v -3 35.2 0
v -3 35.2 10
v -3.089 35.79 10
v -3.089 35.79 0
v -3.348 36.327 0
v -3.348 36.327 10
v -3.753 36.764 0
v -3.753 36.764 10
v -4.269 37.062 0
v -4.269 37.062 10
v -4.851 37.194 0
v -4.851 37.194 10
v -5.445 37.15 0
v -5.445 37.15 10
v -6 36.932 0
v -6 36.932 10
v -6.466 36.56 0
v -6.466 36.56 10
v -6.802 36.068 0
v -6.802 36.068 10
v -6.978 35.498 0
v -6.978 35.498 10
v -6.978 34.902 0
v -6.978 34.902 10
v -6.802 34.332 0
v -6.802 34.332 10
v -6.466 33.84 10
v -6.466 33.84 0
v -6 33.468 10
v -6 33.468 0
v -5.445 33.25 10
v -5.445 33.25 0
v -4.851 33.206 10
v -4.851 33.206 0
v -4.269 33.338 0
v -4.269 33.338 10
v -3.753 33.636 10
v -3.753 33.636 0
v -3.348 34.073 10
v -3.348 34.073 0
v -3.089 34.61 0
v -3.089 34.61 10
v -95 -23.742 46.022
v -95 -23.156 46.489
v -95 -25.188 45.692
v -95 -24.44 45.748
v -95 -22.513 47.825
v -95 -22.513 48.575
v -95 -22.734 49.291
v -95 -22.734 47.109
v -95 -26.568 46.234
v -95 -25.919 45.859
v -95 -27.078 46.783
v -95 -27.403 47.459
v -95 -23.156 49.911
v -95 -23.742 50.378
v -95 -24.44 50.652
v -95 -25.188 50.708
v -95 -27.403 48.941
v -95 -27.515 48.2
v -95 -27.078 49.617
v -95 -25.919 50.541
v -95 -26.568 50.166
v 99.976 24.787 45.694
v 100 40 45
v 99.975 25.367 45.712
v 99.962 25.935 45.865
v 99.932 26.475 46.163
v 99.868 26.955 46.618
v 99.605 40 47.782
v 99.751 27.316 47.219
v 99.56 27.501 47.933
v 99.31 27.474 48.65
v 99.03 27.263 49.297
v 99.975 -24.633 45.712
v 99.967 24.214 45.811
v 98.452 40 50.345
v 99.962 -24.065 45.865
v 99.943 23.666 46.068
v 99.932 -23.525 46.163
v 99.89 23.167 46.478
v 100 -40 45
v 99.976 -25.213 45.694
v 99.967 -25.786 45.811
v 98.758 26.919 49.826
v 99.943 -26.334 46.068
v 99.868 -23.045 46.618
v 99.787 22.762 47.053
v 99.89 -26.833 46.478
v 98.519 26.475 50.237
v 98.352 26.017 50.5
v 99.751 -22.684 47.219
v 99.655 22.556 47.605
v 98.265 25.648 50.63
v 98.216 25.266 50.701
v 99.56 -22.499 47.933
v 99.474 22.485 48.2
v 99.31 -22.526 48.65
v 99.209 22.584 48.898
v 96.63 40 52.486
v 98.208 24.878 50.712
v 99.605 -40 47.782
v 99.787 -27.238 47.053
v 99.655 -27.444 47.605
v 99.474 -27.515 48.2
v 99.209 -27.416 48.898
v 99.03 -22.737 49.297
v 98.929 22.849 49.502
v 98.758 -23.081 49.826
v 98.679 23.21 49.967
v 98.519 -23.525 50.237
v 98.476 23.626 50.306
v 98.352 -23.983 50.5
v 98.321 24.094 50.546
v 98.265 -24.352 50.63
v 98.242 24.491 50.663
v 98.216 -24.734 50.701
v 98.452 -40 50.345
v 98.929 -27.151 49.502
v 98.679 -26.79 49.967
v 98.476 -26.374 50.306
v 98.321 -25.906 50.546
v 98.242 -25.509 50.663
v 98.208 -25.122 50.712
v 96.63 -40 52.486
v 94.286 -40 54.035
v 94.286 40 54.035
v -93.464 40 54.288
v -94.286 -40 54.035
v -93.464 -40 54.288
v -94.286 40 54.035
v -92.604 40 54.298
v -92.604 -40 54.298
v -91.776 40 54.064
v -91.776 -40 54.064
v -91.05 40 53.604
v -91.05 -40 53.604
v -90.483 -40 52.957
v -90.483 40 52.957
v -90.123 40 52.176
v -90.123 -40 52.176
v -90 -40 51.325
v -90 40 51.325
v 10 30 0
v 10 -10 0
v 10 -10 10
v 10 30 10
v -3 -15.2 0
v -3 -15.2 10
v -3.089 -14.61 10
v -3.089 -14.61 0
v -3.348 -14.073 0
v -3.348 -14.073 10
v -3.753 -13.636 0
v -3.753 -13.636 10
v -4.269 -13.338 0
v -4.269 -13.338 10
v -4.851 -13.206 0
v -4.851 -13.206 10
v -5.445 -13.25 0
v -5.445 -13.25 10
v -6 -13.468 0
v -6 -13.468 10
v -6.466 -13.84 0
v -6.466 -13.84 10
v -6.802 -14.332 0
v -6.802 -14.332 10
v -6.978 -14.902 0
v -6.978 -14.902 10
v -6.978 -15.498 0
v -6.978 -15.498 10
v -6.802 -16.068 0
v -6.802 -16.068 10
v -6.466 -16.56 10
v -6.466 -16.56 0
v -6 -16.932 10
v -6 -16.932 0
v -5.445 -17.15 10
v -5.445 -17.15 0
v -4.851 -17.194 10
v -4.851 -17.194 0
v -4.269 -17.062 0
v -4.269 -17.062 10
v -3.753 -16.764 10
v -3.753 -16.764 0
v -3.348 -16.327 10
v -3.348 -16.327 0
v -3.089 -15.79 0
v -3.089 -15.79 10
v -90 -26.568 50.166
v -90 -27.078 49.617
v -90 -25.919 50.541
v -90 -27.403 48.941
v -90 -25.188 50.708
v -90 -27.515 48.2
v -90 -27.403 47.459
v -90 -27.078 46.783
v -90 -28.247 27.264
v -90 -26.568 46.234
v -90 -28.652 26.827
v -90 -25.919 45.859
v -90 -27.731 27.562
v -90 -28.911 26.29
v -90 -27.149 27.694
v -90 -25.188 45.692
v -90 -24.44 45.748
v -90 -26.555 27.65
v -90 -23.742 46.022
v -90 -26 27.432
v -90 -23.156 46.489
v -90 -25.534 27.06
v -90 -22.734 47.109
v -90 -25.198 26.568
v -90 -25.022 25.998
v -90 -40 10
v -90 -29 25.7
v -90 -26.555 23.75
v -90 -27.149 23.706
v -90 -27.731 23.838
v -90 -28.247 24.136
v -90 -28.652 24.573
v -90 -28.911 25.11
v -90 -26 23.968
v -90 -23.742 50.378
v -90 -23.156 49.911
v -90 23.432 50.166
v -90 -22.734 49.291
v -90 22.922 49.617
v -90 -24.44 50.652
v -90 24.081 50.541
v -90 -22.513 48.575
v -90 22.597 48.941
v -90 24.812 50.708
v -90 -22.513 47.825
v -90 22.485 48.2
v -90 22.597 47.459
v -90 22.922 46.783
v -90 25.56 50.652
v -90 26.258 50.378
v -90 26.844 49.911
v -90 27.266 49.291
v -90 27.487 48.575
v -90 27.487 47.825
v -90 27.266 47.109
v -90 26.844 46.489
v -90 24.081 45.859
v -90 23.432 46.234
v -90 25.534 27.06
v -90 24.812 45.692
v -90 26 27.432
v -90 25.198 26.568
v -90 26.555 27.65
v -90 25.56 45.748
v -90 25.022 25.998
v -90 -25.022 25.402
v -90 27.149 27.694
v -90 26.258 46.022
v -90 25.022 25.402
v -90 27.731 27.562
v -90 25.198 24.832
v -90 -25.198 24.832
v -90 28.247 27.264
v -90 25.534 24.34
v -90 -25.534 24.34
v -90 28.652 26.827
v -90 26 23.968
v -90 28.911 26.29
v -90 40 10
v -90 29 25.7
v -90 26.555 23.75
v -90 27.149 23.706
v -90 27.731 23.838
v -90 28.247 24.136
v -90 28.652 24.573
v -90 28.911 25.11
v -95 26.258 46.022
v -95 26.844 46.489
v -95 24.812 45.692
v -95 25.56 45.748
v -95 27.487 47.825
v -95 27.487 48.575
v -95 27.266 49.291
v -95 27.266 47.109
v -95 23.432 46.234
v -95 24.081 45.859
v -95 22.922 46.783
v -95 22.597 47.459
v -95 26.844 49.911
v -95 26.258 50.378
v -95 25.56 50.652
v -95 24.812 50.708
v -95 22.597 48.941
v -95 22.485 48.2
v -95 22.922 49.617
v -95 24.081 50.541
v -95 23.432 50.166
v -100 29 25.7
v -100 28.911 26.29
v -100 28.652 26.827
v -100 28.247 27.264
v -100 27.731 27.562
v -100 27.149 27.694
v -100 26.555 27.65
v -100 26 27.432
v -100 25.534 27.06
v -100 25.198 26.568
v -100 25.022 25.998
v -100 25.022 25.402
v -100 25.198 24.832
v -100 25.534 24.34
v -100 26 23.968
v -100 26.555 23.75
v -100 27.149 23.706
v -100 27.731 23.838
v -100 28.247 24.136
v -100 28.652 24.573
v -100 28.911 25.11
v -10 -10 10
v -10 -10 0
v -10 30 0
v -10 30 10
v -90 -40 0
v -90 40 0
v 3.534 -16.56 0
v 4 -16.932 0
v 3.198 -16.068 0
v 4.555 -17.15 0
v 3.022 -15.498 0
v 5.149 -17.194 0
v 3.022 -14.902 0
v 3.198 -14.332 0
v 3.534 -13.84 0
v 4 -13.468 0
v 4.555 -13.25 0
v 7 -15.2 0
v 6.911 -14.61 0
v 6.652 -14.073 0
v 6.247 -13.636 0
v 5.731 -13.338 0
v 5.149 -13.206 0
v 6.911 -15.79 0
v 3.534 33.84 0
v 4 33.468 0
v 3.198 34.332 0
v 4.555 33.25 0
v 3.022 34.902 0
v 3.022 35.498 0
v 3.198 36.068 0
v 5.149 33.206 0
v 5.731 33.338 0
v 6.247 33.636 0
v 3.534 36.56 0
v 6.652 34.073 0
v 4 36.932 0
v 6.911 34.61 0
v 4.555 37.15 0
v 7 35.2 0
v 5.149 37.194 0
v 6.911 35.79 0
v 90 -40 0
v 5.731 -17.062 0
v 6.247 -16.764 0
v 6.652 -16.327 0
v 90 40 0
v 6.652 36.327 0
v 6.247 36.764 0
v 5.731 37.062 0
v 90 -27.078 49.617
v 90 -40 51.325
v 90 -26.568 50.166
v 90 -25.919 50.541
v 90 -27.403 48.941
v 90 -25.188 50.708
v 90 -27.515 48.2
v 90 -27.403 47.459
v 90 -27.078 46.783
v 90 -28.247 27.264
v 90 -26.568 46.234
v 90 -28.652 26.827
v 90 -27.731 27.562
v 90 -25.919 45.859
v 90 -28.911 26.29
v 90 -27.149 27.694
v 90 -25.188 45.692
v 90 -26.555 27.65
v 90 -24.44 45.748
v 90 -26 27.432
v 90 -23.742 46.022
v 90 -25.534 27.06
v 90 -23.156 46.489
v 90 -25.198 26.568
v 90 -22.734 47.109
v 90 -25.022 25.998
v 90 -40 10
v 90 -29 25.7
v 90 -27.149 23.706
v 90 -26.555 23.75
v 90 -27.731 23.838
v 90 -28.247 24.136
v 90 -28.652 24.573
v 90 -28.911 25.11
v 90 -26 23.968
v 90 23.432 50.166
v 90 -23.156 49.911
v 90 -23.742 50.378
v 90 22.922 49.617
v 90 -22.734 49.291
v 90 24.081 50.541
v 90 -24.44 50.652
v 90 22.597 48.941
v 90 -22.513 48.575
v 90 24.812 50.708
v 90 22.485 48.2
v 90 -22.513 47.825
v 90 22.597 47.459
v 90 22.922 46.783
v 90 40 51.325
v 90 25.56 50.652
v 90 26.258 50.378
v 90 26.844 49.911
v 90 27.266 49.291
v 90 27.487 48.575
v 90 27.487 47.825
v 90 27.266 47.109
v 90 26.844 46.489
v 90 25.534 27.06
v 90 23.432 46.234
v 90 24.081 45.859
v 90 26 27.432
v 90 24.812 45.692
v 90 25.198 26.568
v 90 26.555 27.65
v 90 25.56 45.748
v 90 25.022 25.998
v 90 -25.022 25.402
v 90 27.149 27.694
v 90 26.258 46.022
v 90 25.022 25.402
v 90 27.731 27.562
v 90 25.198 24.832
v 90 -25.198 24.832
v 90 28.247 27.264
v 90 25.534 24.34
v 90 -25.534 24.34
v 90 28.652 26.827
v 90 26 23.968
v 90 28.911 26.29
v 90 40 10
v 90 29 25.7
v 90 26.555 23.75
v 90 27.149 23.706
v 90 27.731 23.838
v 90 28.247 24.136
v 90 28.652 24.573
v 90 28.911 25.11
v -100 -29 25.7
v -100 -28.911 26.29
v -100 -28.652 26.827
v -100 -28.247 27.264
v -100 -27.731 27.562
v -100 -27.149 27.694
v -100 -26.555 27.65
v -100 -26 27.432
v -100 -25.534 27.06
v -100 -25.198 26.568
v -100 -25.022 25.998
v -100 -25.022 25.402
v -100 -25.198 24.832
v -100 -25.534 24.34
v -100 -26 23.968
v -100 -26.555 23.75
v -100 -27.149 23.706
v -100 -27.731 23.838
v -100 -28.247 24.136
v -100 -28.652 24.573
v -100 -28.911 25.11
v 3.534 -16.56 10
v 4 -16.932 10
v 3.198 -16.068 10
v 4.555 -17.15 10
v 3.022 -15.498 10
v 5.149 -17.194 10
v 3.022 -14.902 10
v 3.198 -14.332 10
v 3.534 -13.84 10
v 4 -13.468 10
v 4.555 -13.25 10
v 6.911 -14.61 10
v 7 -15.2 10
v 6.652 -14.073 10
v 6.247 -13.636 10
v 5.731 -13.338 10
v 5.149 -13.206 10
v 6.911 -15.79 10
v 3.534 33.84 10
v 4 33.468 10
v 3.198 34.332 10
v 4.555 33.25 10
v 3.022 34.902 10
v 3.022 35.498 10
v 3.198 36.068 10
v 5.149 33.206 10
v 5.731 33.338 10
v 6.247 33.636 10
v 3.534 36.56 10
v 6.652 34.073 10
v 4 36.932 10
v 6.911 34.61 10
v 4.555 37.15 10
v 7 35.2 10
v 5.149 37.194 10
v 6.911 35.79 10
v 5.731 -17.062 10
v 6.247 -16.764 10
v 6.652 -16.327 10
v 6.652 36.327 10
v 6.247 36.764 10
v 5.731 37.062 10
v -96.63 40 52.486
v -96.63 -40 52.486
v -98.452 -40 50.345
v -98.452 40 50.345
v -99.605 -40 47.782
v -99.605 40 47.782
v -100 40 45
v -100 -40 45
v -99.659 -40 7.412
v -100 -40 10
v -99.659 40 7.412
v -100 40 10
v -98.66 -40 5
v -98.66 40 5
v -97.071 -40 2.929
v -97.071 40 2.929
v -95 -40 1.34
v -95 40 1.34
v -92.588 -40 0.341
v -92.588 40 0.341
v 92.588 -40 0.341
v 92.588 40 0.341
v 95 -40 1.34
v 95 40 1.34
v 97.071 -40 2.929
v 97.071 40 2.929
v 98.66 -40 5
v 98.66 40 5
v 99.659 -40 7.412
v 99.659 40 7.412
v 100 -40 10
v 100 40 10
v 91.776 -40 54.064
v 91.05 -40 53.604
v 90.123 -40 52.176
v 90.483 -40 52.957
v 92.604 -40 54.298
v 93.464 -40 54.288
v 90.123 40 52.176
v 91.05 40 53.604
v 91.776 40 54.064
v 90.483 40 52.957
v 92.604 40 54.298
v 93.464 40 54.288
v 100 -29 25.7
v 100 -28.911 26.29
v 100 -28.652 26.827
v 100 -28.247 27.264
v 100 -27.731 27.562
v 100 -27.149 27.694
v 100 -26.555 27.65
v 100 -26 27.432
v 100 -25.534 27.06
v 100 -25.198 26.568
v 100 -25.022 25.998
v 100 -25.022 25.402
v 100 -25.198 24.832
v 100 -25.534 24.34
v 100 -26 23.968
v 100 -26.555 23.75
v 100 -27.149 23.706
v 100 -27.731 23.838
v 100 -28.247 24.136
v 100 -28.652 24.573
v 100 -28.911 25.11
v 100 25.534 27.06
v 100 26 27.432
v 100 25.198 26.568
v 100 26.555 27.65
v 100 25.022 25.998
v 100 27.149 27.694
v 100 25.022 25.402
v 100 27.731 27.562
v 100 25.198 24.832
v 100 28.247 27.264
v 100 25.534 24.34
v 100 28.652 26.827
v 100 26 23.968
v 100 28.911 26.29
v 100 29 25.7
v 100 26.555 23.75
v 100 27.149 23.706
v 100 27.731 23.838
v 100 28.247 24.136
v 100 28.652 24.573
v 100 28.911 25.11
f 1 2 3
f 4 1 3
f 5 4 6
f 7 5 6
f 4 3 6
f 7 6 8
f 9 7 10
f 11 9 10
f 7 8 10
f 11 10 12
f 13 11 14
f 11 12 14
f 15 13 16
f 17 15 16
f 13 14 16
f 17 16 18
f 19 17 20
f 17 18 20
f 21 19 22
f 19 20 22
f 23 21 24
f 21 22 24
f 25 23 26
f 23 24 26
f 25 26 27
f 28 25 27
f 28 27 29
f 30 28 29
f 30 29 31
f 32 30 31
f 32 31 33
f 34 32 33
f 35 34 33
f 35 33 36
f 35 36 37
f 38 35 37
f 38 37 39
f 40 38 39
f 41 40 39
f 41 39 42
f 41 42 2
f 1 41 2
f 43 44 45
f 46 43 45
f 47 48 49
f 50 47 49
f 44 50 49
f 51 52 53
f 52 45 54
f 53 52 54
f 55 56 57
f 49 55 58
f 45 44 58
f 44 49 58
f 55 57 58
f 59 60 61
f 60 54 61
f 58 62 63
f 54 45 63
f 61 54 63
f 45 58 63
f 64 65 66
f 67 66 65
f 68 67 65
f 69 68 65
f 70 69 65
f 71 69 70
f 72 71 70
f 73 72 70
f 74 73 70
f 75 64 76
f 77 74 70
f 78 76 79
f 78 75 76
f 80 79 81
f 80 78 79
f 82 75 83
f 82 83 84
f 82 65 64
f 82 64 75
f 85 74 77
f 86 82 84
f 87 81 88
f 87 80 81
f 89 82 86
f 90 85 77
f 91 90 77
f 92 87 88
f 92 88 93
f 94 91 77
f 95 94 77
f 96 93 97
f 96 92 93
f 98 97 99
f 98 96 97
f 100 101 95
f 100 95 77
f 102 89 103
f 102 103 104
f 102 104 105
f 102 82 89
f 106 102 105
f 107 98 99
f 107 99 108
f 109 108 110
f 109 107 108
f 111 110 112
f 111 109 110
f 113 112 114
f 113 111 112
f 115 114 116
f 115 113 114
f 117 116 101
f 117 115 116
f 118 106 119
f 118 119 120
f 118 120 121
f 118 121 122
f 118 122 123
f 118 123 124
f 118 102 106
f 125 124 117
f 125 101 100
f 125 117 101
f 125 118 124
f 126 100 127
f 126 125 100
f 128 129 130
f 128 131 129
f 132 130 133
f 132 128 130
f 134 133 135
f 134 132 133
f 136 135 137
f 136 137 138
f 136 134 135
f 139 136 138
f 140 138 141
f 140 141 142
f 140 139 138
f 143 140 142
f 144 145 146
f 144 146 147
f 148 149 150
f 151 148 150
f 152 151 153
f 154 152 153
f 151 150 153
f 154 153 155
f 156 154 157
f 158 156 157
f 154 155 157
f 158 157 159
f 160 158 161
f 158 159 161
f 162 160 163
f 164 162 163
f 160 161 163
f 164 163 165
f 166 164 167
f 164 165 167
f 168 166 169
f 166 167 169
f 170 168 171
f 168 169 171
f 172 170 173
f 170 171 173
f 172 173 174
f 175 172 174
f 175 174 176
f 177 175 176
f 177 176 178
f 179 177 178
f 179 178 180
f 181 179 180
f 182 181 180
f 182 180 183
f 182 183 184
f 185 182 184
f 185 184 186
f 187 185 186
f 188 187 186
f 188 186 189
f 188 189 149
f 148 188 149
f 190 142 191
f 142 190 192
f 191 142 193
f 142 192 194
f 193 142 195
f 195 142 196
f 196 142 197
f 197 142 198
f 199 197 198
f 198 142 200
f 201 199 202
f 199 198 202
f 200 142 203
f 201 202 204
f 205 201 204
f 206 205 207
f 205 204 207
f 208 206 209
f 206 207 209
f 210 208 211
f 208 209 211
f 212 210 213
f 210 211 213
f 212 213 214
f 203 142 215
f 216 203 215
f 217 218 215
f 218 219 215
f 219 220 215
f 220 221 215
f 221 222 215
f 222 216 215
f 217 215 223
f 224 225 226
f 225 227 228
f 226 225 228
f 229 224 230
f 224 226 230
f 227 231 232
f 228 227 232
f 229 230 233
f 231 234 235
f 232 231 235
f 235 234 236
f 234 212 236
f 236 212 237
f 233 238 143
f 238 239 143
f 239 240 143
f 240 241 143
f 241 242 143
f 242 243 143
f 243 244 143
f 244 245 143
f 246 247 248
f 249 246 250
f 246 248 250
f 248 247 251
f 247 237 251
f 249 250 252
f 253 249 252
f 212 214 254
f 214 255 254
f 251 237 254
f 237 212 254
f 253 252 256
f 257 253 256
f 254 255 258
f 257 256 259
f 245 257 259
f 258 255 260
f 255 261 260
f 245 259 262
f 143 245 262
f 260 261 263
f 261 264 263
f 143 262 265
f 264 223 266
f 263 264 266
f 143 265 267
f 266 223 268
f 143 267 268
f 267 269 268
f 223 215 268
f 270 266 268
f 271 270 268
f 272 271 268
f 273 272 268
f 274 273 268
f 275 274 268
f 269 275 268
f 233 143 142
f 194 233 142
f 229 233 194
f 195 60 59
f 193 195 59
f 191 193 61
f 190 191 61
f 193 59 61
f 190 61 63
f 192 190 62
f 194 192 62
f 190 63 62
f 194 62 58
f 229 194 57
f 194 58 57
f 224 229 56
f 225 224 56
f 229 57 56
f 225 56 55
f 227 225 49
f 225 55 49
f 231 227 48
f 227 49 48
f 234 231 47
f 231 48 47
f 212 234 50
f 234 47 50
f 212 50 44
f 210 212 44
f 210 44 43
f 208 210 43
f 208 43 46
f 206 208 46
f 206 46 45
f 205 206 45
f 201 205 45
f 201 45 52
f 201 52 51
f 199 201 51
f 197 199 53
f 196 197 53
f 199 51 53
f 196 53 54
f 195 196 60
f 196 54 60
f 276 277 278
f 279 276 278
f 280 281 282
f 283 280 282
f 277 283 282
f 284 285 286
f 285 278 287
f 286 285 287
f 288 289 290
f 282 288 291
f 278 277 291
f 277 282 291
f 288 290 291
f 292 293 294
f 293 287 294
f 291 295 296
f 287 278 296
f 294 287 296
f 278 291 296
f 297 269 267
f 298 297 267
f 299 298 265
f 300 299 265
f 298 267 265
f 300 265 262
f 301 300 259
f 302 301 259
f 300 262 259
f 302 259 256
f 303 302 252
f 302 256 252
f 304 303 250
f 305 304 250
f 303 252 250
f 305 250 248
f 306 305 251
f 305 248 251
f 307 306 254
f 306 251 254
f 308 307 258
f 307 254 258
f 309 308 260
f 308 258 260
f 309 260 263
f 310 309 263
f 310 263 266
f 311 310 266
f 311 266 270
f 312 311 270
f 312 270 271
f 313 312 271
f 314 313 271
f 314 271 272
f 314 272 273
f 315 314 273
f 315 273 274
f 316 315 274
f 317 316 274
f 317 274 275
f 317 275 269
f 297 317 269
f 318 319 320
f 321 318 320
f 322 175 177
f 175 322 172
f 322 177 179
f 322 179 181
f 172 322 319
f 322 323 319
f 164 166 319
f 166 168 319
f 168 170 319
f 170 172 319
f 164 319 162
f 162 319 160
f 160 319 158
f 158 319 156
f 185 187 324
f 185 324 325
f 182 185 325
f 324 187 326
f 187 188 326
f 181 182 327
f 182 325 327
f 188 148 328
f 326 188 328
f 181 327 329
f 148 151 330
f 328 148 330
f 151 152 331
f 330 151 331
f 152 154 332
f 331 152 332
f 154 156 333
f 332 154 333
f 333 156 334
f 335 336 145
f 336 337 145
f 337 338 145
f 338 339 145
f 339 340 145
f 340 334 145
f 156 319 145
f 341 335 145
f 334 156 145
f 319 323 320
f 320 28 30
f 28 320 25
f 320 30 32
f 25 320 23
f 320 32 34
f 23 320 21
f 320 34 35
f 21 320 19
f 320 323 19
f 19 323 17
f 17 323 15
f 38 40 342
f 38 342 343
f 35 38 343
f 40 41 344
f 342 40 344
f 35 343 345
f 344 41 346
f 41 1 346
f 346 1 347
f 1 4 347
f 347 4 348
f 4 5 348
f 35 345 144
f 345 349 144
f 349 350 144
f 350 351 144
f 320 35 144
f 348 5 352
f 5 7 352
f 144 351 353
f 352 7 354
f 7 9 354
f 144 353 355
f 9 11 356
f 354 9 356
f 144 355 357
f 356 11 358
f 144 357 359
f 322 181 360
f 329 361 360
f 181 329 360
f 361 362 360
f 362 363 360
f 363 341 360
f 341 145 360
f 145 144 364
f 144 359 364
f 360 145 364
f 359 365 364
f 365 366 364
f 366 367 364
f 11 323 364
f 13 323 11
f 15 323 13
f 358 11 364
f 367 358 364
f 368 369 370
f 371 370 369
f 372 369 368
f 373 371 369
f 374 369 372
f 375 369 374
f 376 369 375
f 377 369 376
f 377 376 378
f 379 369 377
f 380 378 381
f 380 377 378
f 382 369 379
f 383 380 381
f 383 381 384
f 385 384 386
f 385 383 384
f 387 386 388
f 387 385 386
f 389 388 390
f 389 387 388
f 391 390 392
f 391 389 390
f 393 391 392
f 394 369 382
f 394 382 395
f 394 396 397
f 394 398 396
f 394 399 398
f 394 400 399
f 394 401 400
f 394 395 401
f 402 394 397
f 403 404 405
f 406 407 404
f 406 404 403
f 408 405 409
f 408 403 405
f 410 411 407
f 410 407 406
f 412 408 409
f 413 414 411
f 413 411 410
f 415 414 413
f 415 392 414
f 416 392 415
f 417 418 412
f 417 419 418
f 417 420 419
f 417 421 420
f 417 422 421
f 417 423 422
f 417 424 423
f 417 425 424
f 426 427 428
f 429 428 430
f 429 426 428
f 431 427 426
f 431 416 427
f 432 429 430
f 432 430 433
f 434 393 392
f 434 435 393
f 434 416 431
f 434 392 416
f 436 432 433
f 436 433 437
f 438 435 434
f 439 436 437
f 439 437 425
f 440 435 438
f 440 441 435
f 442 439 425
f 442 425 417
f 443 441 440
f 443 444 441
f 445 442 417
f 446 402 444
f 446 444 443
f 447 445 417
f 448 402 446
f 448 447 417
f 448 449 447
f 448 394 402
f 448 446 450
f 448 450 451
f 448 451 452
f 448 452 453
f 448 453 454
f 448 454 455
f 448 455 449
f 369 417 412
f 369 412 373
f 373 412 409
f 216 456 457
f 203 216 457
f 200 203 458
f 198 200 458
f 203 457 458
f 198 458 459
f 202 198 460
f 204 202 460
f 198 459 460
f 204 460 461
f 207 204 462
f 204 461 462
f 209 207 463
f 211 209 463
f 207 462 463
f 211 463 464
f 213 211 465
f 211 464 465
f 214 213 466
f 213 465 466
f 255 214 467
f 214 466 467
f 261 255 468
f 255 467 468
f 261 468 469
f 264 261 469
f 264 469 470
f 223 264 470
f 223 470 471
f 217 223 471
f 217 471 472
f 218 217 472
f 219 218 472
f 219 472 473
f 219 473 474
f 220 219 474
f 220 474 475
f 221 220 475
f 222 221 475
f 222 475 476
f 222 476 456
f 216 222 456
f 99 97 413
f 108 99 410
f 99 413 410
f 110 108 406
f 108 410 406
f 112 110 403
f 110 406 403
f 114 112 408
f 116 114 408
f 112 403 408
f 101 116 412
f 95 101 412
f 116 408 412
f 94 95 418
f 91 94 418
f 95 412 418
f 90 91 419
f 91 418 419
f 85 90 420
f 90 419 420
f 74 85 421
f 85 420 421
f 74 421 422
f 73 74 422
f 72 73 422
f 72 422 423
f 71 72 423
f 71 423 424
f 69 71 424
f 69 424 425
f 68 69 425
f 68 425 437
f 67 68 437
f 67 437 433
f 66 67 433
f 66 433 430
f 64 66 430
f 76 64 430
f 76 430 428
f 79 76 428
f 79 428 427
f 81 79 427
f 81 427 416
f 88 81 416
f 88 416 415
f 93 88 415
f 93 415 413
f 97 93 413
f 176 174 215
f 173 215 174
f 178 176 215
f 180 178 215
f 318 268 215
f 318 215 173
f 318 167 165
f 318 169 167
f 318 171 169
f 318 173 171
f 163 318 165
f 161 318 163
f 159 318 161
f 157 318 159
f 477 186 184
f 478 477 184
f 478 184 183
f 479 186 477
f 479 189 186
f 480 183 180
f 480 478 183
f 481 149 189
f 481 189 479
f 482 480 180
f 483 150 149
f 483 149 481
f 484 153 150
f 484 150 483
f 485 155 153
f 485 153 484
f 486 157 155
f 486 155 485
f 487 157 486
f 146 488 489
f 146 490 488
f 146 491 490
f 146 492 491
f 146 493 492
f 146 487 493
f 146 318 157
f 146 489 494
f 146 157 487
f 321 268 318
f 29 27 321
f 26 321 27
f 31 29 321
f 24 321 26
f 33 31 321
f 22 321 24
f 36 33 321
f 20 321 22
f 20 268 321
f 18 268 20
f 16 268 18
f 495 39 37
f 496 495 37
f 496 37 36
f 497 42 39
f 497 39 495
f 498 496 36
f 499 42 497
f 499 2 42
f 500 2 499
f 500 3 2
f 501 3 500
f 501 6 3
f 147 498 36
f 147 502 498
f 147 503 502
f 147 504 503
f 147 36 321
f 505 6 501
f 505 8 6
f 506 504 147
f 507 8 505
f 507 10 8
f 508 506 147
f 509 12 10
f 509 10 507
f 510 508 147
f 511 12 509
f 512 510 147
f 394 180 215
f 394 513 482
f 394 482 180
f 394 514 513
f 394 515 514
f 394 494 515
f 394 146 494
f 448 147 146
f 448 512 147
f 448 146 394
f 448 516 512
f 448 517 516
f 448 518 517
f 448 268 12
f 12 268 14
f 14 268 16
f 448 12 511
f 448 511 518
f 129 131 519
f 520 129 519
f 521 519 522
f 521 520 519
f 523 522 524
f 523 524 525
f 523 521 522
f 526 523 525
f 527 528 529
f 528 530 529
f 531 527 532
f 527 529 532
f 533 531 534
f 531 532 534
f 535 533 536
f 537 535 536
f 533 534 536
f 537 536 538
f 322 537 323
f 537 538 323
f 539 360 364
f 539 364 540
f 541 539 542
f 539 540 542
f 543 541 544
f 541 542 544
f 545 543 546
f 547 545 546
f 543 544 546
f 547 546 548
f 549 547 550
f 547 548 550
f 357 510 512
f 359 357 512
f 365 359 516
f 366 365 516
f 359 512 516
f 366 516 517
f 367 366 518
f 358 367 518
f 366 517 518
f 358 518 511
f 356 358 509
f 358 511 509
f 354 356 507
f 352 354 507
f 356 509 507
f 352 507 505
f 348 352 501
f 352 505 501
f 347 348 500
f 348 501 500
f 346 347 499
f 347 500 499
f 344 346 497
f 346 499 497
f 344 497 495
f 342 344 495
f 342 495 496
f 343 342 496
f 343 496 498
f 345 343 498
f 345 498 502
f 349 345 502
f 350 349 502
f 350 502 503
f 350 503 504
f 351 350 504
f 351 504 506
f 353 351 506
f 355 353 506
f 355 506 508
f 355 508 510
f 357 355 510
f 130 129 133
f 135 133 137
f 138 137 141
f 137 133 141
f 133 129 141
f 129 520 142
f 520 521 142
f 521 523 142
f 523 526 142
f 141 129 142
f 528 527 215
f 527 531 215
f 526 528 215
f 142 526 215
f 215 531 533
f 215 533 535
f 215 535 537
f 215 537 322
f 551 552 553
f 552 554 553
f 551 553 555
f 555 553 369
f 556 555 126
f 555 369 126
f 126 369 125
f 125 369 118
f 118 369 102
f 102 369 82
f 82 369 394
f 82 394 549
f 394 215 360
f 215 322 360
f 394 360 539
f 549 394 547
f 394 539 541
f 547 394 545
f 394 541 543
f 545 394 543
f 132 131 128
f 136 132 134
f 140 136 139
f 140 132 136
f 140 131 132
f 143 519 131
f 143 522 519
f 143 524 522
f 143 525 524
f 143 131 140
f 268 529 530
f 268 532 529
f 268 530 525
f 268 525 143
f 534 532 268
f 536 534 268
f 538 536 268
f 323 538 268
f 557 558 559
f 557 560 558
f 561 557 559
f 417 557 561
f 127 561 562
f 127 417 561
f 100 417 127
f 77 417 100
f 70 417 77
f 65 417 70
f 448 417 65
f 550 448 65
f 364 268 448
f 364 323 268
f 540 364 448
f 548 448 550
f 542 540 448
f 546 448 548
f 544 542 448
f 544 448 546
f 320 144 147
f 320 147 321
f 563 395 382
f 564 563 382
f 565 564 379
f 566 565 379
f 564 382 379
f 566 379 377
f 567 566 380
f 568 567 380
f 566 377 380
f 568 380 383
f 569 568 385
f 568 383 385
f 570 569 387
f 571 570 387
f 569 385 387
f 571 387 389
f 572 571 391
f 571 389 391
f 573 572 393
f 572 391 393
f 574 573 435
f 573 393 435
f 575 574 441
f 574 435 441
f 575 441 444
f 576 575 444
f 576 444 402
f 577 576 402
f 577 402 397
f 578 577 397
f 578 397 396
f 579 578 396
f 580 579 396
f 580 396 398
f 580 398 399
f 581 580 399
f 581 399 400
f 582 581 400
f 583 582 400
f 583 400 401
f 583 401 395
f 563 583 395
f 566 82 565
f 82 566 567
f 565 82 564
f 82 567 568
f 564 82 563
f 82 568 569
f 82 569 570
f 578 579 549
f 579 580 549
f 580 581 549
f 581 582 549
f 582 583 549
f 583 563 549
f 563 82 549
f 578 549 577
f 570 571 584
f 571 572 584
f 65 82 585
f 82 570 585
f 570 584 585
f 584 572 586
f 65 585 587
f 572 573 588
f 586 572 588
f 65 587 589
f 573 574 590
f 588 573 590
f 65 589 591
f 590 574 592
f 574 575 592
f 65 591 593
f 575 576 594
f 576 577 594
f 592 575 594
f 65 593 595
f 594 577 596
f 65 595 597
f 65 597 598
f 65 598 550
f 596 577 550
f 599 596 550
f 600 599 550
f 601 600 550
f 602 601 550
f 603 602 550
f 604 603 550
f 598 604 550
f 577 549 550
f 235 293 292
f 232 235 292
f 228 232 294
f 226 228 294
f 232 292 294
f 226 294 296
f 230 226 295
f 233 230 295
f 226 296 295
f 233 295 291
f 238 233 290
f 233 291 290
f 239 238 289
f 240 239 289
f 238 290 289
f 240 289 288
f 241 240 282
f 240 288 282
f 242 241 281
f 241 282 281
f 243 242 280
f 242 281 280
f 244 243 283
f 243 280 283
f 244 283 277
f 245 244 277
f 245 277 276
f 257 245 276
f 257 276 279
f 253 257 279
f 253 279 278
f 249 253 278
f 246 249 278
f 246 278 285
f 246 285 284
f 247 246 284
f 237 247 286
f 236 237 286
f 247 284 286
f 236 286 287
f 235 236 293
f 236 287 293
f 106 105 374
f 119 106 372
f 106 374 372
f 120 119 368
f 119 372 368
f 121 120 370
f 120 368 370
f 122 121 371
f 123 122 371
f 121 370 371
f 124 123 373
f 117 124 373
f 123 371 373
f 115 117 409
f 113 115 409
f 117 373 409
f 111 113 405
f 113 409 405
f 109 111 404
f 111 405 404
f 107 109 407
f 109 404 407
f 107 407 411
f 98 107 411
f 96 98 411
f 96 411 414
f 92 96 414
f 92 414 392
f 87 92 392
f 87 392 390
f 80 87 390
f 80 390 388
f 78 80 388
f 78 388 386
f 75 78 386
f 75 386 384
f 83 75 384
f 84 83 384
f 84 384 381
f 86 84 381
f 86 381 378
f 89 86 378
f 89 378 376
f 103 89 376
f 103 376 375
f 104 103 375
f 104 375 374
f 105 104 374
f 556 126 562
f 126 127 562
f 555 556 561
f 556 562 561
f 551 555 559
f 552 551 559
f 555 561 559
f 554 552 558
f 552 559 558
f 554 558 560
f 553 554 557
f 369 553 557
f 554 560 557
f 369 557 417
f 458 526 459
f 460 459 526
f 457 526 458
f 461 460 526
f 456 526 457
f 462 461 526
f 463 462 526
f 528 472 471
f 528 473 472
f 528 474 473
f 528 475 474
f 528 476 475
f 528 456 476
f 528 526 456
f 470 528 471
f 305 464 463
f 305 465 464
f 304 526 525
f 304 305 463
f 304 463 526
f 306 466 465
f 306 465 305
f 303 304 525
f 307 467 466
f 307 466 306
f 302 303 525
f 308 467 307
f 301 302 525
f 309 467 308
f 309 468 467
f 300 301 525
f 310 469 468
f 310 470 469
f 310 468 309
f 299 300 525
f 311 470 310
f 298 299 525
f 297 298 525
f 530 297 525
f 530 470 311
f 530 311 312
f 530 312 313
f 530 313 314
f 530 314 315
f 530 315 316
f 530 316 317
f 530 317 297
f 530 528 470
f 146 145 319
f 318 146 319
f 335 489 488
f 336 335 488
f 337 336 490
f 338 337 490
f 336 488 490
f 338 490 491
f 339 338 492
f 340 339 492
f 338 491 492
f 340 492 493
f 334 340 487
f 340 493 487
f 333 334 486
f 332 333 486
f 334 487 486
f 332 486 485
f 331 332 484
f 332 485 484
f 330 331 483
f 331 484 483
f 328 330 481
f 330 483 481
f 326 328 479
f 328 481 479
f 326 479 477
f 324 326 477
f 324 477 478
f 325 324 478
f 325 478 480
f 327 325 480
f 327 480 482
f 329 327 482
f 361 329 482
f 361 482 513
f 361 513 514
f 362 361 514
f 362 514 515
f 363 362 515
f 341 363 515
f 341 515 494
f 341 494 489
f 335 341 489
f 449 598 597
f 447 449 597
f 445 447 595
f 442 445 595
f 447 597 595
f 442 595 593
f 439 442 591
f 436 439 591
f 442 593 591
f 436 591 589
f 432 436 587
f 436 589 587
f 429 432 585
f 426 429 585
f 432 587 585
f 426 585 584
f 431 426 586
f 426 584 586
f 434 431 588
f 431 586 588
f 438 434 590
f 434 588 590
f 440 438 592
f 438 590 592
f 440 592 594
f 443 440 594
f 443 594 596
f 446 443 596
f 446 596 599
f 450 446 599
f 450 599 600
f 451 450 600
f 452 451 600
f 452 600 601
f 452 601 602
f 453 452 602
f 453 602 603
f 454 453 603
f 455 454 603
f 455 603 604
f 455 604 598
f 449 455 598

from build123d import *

# Parameters (mm, degrees)
ESQUISSE1_W             = 200
ESQUISSE1_H             = 80
BOSS_EXTRU_1_DEPTH      = 10
ESQUISSE2_W             = 10
ESQUISSE2_H             = 80
BOSS_EXTRU_2_DEPTH      = 50
ESQUISSE8_R             = 2
ENL_V_MAT_EXTRU_3_DEPTH = 213.602916255
ESQUISSE9_W             = 10
ESQUISSE9_H             = 80
ENL_V_MAT_EXTRU_4_DEPTH = 5
ESQUISSE10_R            = 2.515
ENL_V_MAT_EXTRU_5_DEPTH = 202.804360706
ENL_V_START             = -5
ESQUISSE11_R            = 2.515
ENL_V_MAT_EXTRU_6_DEPTH = 5
CONG_1_R                = 10
CONG_2_START            = -41
CONG_2_DEPTH            = 82
CONG_3_R                = 3
ESQUISSE12_W            = 20
ESQUISSE12_H            = 40
ENL_V_MAT_EXTRU_7_DEPTH = 121.628178046
ESQUISSE13_R            = 2
ENL_V_MAT_EXTRU_8_DEPTH = 117.467447093
ESQUISSE14_R            = 2
ENL_V_MAT_EXTRU_9_DEPTH = 212.071450838


with BuildPart() as part:
    # Esquisse1 → Boss.-Extru.1 (new body)
    with BuildSketch(Plane.XY):
        Rectangle(ESQUISSE1_W, ESQUISSE1_H)
    extrude(amount=BOSS_EXTRU_1_DEPTH)

    # Esquisse2 → Boss.-Extru.2 (add)
    with BuildSketch(Plane.XY.offset(10)):
        with Locations((-95, 0)):
            Rectangle(ESQUISSE2_W, ESQUISSE2_H)
        with Locations((95, 0)):
            Rectangle(ESQUISSE2_W, ESQUISSE2_H)
    extrude(amount=BOSS_EXTRU_2_DEPTH)

    # Esquisse8 → Enlèv. mat.-Extru.3 (cut, through all)
    with BuildSketch(Plane(origin=(100, 0, 0), x_dir=(0, 0, -1), z_dir=(1, 0, 0))):
        with Locations(Location((-25.7, 27, 0), (0, 0, 90))):
            Circle(ESQUISSE8_R)
    extrude(amount=-ENL_V_MAT_EXTRU_3_DEPTH, mode=Mode.SUBTRACT)

    # Esquisse9 → Enlèv. mat.-Extru.4 (cut)
    with BuildSketch(Plane.XY.offset(60)):
        with Locations((-95, 0)):
            Rectangle(ESQUISSE9_W, ESQUISSE9_H)
        with Locations((95, 0)):
            Rectangle(ESQUISSE9_W, ESQUISSE9_H)
    extrude(amount=-ENL_V_MAT_EXTRU_4_DEPTH, mode=Mode.SUBTRACT)

    # Esquisse10 → Enlèv. mat.-Extru.5 (cut, through all)
    with BuildSketch(Plane.ZY.offset(-90)):
        with Locations(Location((48.2, 25, 0), (0, 0, 270))):
            Circle(ESQUISSE10_R)
        with Locations(Location((48.2, -25, 0), (0, 0, 270))):
            Circle(ESQUISSE10_R)
    extrude(amount=-ENL_V_MAT_EXTRU_5_DEPTH, mode=Mode.SUBTRACT)

    # Esquisse11 → Enlèv. mat.-Extru.6 (cut)
    with BuildSketch(Plane.ZY.offset(100).offset(ENL_V_START)):
        with Locations(Location((48.2, 25, 0), (0, 0, 270))):
            Circle(ESQUISSE11_R)
        with Locations(Location((48.2, -25, 0), (0, 0, 270))):
            Circle(ESQUISSE11_R)
    extrude(amount=-ENL_V_MAT_EXTRU_6_DEPTH, mode=Mode.SUBTRACT)

    # Congé1
    cong_1_edges = [part.edges().sort_by_distance(p)[0] for p in [
        (-100, 0, 0),
        (100, 0, 0),
    ]]
    fillet(cong_1_edges, radius=CONG_1_R)

    # Congé2: read off the stored shape, not the designer's step
    # Congé2 outline → Congé2 (cut)
    with BuildSketch(Plane(origin=(0, 0, 0), x_dir=(1, 0, 0), z_dir=(0, 1, 0)).offset(CONG_2_START)):
        with BuildLine():
            Line((100, -55), (100, -45))
            ThreePointArc((100, -45), (97.071067812, -52.071067812), (90, -55))
            Line((90, -55), (100, -55))
        make_face()
        with BuildLine():
            ThreePointArc((-90, -55), (-97.071067812, -52.071067812), (-100, -45))
            Line((-100, -45), (-100, -55))
            Line((-100, -55), (-90, -55))
        make_face()
    extrude(amount=CONG_2_DEPTH, mode=Mode.SUBTRACT)

    # Congé3
    cong_3_edges = [part.edges().sort_by_distance(p)[0] for p in [
        (-90, 0, 55),
        (90, 0, 55),
    ]]
    fillet(cong_3_edges, radius=CONG_3_R)

    # Esquisse12 → Enlèv. mat.-Extru.7 (cut, through all)
    with BuildSketch(Plane(origin=(0, 0, 0), x_dir=(-1, 0, 0), z_dir=(0, 0, -1))):
        with Locations((0, 10)):
            Rectangle(ESQUISSE12_W, ESQUISSE12_H)
    extrude(amount=-ENL_V_MAT_EXTRU_7_DEPTH, mode=Mode.SUBTRACT)

    # Esquisse13 → Enlèv. mat.-Extru.8 (cut, through all)
    with BuildSketch(Plane.XY.offset(10)):
        with Locations((-5, 35.2)):
            Circle(ESQUISSE13_R)
        with Locations((5, 35.2)):
            Circle(ESQUISSE13_R)
        with Locations((-5, -15.2)):
            Circle(ESQUISSE13_R)
        with Locations((5, -15.2)):
            Circle(ESQUISSE13_R)
    extrude(amount=-ENL_V_MAT_EXTRU_8_DEPTH, mode=Mode.SUBTRACT)

    # Esquisse14 → Enlèv. mat.-Extru.9 (cut, through all)
    with BuildSketch(Plane.ZY.offset(100)):
        with Locations(Location((25.7, 27, 0), (0, 0, 90))):
            Circle(ESQUISSE14_R)
        with Locations(Location((25.7, -27, 0), (0, 0, 270))):
            Circle(ESQUISSE14_R)
    extrude(amount=-ENL_V_MAT_EXTRU_9_DEPTH, mode=Mode.SUBTRACT)


solid = part.part
